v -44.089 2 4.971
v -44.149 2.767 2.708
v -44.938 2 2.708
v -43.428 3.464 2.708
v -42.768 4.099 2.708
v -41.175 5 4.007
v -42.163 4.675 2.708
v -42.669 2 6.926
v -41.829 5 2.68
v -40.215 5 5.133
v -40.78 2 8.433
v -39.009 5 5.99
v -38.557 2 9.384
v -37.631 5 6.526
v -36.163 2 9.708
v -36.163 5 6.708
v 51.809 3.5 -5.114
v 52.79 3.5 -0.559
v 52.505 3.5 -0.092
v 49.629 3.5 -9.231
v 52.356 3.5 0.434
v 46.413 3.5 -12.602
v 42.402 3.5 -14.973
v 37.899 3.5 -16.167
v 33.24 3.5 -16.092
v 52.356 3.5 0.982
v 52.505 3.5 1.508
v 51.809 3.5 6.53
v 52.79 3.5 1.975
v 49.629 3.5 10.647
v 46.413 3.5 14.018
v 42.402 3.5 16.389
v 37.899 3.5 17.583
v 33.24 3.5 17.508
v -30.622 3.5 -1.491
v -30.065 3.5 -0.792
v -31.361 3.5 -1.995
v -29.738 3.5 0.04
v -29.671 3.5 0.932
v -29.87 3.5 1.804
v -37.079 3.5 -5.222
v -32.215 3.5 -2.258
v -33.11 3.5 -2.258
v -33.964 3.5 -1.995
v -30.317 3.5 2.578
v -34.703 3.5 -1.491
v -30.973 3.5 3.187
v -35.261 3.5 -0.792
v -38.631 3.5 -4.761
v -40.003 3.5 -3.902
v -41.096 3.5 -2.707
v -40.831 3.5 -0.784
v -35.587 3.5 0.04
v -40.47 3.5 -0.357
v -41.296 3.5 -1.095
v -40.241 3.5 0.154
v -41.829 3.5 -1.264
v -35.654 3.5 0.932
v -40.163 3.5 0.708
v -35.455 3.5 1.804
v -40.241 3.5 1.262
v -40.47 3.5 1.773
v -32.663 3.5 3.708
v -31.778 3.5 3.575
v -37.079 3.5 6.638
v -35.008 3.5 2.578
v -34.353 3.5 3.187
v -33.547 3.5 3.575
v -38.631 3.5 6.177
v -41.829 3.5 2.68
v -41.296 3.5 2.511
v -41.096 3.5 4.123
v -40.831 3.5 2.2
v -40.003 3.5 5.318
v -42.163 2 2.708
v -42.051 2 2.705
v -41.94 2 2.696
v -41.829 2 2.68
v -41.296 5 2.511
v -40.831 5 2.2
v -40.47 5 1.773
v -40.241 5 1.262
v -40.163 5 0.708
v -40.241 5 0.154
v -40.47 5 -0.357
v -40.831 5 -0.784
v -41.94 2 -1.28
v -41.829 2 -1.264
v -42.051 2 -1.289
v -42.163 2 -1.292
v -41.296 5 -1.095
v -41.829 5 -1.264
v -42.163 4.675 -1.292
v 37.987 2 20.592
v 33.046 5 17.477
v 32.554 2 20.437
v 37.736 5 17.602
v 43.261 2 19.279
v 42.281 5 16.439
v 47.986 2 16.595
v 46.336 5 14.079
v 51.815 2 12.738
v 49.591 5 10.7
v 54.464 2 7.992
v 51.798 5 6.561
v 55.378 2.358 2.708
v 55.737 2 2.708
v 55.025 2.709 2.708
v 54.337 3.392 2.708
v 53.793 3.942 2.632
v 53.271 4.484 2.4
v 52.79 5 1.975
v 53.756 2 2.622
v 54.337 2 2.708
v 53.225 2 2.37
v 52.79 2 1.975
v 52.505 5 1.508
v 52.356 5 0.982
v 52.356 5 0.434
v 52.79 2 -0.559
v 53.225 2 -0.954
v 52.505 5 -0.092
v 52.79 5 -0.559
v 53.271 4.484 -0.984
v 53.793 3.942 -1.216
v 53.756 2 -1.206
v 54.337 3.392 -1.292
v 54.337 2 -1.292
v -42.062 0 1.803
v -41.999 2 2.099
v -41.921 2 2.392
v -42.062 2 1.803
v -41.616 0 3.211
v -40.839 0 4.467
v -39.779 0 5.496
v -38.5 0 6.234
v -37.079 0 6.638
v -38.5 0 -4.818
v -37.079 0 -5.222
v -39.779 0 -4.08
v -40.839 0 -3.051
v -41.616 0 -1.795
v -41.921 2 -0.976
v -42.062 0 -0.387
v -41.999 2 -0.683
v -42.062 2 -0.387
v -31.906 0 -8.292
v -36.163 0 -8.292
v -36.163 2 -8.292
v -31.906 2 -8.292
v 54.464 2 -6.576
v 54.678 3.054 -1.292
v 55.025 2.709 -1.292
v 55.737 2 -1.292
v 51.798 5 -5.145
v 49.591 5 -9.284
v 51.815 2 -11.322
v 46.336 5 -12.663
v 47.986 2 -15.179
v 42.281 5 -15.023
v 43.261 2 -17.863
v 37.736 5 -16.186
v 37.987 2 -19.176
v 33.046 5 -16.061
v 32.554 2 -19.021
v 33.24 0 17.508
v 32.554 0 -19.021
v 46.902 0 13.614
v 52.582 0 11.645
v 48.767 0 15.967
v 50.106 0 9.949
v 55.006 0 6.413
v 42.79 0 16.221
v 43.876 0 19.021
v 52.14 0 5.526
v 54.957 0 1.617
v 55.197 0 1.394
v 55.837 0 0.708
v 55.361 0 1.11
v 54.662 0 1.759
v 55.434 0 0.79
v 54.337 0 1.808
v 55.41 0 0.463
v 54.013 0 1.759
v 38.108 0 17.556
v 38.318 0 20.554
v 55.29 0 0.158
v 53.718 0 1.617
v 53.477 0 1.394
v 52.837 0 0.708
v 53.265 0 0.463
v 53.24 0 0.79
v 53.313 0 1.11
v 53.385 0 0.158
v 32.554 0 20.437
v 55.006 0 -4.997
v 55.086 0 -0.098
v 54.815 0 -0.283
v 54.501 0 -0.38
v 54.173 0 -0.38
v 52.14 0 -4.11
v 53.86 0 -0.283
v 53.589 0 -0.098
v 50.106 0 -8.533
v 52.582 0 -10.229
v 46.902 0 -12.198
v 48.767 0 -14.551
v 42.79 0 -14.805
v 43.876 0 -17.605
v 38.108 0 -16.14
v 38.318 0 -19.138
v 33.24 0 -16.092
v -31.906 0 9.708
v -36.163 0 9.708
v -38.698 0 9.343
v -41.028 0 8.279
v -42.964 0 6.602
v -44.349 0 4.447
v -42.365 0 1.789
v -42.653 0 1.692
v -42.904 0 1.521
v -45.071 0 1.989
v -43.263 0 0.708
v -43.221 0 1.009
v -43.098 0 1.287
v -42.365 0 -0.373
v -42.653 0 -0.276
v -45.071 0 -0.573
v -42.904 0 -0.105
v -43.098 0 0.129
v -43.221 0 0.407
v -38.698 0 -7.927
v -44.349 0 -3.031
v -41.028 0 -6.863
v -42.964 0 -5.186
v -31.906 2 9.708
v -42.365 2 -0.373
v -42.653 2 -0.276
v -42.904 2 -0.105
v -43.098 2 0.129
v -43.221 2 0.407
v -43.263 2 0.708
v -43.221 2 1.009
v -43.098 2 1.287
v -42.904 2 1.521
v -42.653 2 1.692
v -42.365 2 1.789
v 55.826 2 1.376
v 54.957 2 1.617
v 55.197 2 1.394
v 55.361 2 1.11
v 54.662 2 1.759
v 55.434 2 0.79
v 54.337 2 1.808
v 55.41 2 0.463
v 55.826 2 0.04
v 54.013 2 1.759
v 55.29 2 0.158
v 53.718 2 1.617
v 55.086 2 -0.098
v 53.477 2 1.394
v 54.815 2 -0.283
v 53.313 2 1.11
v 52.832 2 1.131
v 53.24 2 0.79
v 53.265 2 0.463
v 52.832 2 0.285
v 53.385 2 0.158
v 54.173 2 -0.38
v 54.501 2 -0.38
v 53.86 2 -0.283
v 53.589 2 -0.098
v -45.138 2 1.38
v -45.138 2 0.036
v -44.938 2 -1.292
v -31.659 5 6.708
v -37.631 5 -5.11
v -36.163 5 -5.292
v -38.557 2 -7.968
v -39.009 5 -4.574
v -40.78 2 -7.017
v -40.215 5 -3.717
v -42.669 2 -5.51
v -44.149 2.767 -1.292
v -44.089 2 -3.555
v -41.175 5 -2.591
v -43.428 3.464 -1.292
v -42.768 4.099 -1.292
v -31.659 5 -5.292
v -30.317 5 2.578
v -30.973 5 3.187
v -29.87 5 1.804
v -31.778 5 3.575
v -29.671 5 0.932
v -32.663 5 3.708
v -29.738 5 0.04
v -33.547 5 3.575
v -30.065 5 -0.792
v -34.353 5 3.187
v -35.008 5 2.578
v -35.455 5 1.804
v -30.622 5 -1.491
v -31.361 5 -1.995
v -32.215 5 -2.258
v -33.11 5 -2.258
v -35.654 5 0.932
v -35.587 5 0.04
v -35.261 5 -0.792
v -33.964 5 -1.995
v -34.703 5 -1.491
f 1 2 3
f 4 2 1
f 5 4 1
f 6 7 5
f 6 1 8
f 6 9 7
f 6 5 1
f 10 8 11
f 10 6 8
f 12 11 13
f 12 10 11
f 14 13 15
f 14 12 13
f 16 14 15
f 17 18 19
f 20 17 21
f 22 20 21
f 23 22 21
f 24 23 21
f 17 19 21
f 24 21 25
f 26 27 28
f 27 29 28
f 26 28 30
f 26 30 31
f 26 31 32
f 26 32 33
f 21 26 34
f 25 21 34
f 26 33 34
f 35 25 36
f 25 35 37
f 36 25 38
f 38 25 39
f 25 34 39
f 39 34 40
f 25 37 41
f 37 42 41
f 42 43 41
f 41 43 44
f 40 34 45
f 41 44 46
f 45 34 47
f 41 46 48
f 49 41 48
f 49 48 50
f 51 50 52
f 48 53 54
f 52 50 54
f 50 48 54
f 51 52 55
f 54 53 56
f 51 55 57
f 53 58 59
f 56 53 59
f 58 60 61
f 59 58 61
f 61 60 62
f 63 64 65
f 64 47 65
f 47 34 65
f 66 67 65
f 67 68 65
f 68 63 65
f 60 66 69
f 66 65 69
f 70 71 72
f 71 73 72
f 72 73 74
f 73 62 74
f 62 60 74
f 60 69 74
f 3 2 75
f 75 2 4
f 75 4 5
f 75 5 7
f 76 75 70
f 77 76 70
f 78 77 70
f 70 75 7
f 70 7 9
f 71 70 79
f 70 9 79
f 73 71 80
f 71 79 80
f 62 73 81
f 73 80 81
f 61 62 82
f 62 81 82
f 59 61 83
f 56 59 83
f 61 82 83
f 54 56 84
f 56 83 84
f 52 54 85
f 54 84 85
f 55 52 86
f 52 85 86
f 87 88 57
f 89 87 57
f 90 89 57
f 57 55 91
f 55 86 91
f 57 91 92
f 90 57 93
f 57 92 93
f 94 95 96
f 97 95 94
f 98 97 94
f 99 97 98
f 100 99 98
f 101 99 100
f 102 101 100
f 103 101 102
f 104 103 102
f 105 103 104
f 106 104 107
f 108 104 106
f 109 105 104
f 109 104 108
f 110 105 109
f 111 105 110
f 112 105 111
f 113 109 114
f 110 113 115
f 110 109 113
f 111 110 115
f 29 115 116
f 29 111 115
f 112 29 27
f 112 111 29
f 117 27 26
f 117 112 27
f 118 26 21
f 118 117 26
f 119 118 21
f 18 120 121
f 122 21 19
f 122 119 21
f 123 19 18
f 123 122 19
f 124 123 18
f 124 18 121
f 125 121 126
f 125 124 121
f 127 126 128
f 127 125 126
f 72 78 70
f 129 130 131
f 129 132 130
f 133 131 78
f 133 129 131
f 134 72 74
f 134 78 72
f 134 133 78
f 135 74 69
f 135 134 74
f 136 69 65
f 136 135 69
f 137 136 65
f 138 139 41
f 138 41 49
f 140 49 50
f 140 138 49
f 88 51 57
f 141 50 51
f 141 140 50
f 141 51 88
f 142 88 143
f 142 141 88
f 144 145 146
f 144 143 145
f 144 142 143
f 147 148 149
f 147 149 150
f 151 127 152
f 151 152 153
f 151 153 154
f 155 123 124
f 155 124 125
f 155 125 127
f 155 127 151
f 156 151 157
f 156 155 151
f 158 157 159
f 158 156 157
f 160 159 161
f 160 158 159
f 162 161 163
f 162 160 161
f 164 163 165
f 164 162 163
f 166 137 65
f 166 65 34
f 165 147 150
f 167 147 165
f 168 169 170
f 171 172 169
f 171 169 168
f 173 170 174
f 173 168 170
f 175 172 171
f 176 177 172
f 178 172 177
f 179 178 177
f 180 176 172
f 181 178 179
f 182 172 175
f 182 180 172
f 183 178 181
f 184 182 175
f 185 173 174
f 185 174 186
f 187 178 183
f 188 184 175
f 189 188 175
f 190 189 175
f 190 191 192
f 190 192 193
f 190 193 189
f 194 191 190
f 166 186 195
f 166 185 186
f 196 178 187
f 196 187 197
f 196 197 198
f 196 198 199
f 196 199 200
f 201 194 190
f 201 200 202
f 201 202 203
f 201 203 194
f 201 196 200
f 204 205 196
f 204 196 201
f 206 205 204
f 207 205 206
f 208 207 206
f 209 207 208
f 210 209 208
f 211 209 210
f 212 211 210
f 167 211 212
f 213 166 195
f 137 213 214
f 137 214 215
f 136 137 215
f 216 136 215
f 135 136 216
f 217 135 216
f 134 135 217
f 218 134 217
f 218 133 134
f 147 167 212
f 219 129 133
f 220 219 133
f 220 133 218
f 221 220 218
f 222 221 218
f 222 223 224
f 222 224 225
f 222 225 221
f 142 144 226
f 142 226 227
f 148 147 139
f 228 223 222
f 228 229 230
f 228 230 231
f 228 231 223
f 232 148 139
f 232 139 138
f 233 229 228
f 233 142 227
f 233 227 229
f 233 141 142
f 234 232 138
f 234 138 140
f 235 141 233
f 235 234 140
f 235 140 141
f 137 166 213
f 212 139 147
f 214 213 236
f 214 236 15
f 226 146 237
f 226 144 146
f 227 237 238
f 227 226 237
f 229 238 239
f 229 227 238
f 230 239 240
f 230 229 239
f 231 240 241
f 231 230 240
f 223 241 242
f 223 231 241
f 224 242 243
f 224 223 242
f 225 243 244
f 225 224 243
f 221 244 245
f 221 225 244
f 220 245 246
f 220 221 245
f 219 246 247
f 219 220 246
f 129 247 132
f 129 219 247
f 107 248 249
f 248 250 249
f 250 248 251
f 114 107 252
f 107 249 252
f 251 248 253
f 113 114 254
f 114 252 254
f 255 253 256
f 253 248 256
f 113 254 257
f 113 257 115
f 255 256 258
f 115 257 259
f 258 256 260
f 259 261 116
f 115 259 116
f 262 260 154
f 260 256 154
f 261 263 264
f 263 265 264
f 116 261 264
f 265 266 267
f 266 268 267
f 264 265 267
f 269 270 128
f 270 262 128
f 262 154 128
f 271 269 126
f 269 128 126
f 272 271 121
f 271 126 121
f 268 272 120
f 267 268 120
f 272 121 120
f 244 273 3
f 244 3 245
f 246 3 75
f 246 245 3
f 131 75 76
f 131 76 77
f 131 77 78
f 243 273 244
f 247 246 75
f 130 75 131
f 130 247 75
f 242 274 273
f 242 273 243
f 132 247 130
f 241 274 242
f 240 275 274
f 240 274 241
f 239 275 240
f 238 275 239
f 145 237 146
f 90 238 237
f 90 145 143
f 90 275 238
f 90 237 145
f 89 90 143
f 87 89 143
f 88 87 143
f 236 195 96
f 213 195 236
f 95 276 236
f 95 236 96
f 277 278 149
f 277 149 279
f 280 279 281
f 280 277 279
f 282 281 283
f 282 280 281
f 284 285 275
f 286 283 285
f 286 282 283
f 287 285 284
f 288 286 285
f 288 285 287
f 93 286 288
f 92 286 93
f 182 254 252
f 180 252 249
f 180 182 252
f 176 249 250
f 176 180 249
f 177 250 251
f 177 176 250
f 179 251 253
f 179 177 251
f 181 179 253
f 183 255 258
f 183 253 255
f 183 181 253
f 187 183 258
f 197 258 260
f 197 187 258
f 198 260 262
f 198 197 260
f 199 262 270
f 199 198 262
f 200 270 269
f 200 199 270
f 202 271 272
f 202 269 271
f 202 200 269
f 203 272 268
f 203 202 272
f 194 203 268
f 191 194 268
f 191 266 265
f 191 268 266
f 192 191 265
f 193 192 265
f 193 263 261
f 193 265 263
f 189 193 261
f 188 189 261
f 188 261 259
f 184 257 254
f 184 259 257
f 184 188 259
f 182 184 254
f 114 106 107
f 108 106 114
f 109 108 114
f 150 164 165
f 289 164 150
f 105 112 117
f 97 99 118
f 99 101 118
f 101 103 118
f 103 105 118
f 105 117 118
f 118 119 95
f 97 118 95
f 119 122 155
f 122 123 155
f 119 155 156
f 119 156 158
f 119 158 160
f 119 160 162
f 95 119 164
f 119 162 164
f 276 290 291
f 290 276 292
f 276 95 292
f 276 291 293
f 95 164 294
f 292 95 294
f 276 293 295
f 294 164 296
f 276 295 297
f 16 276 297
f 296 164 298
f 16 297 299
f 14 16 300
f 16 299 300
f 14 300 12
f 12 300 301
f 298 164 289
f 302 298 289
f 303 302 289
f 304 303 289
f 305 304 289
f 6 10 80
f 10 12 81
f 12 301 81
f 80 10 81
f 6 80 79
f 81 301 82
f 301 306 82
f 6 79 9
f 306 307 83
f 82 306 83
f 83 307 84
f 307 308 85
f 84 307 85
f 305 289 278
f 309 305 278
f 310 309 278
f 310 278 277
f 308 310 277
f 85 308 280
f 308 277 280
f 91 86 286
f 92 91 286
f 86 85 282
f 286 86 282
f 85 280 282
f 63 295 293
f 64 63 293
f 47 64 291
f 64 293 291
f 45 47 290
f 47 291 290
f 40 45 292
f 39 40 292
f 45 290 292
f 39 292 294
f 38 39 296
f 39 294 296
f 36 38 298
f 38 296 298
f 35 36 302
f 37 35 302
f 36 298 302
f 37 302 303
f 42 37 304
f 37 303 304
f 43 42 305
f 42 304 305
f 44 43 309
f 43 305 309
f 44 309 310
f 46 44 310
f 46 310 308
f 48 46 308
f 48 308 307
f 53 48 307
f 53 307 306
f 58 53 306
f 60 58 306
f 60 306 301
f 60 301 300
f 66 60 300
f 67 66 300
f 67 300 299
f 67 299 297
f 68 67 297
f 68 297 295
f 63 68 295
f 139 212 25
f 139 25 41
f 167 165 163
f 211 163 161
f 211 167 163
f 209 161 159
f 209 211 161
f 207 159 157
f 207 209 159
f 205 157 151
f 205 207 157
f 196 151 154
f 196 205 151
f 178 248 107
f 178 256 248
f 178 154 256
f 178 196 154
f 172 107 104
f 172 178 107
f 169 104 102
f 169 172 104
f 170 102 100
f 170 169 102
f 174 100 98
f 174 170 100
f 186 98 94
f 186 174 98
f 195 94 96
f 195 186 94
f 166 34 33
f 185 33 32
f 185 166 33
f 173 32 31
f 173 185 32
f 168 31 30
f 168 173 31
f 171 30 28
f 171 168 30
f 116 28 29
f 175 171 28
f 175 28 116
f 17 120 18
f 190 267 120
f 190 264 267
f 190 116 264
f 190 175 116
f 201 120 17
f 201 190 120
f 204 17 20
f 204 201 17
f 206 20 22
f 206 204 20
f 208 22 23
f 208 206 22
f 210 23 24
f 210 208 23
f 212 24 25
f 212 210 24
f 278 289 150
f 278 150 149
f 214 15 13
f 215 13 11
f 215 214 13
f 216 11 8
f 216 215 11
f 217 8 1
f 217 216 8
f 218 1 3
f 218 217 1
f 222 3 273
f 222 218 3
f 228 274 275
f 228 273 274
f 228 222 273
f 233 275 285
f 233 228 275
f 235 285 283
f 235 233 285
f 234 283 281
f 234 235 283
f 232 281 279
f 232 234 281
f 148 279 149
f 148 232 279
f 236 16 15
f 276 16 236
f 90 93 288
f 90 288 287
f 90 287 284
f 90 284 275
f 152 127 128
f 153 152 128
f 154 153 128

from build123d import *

# Parameters (mm, degrees)
SKETCH2_R           = 1.1
BOSS_EXTRUDE1_DEPTH = 5
SKETCH3_OUTSIDE_W   = 130.75
SKETCH3_OUTSIDE_H   = 69.75
CUT_EXTRUDE1_DEPTH  = 3
CUT_EXTRUDE1_DRAFT  = -45
CUT_EXTRUDE2_DEPTH  = 3
CUT_EXTRUDE3_DEPTH  = 3
SKETCH6_R           = 3
CUT_EXTRUDE4_DEPTH  = 9
CUT_EXTRUDE5_DEPTH  = 3.5


with BuildPart() as part:
    # Sketch2 → Boss-Extrude1 (new body)
    with BuildSketch(Plane(origin=(0, 0, 0), x_dir=(1, 0, 0), z_dir=(0, 1, 0))):
        with BuildLine():
            Line((-36.162601626, 8.29200542), (-31.906454434, 8.29200542))
            Line((-31.906454434, 8.29200542), (32.553816284, 19.020616336))
            ThreePointArc((32.553816284, 19.020616336), (55.837398374, -0.70799458), (32.553816284, -20.436605496))
            Line((32.553816284, -20.436605496), (-31.906454434, -9.70799458))
            Line((-31.906454434, -9.70799458), (-36.162601626, -9.70799458))
            ThreePointArc((-36.162601626, -9.70799458), (-45.162601626, -0.70799458), (-36.162601626, 8.29200542))
        make_face()
        with Locations(Location((-42.162601626, -0.70799458, 0), (0, 0, 270))):
            Circle(SKETCH2_R, mode=Mode.SUBTRACT)
        with Locations(Location((54.337398374, -0.70799458, 0), (0, 0, 270))):
            Circle(SKETCH2_R, mode=Mode.SUBTRACT)
    extrude(amount=BOSS_EXTRUDE1_DEPTH)


with BuildPart() as cut_extrude1_tool:
    # Sketch3 outside → Cut-Extrude1 (with draft: the straight prism first)
    with BuildSketch(Plane(origin=(0, 5, 0), x_dir=(1, 0, 0), z_dir=(0, 1, 0))):
        with Locations((5.337, -0.708)):
            Rectangle(SKETCH3_OUTSIDE_W, SKETCH3_OUTSIDE_H)
        with BuildLine():
            ThreePointArc((-36.162601626, 5.29200542), (-42.162601626, -0.70799458), (-36.162601626, -6.70799458))
            Line((-36.162601626, -6.70799458), (-31.658503498, -6.70799458))
            Line((-31.658503498, -6.70799458), (33.046353598, -17.477313858))
            ThreePointArc((33.046353598, -17.477313858), (52.837398374, -0.70799458), (33.046353598, 16.061324698))
            Line((33.046353598, 16.061324698), (-31.658503498, 5.29200542))
            Line((-31.658503498, 5.29200542), (-36.162601626, 5.29200542))
        make_face(mode=Mode.SUBTRACT)
    extrude(amount=-CUT_EXTRUDE1_DEPTH)
    # Cut-Extrude1: the draft: its side faces are tilted about the plane it starts from
    cut_extrude1_sides = [cut_extrude1_tool.faces().sort_by_distance(p)[0] for p in [
        (5.337, 3.5, 35.583),
        (70.712, 3.5, 0.708),
        (5.337, 3.5, -34.167),
        (-60.038, 3.5, 0.708),
        (-33.910552562, 3.5, -5.29200542),
        (0.69392505, 3.5, -10.676665059),
        (52.837398374, 3.5, 0.70799458),
        (0.69392505, 3.5, 12.092654219),
        (-33.910552562, 3.5, 6.70799458),
        (-42.162601626, 3.5, 0.70799458),
    ]]
    draft(cut_extrude1_sides, Plane(origin=(0, 5, 0), x_dir=(1, 0, 0), z_dir=(0, 1, 0)), CUT_EXTRUDE1_DRAFT)


with BuildPart() as part_1:
    add(part.part)

    # Cut-Extrude1: cut by cut_extrude1_tool
    add(cut_extrude1_tool.part, mode=Mode.SUBTRACT)

    # Sketch4 → Cut-Extrude2 (cut)
    with BuildSketch(Plane(origin=(0, 5, 0), x_dir=(1, 0, 0), z_dir=(0, 1, 0))):
        with BuildLine():
            Line((-42.162601626, 1.29200542), (-47.036094896, 1.29200542))
            Line((-47.036094896, 1.29200542), (-47.036094896, -2.70799458))
            Line((-47.036094896, -2.70799458), (-42.162601626, -2.70799458))
            ThreePointArc((-42.162601626, -2.70799458), (-40.162601626, -0.70799458), (-42.162601626, 1.29200542))
        make_face()
    extrude(amount=-CUT_EXTRUDE2_DEPTH, mode=Mode.SUBTRACT)

    # Sketch5 → Cut-Extrude3 (cut)
    with BuildSketch(Plane(origin=(0, 5, 0), x_dir=(1, 0, 0), z_dir=(0, 1, 0))):
        with BuildLine():
            Line((54.337398374, 1.29200542), (57.452649993, 1.29200542))
            Line((57.452649993, 1.29200542), (57.452649993, -2.70799458))
            Line((57.452649993, -2.70799458), (54.337398374, -2.70799458))
            ThreePointArc((54.337398374, -2.70799458), (52.337398374, -0.70799458), (54.337398374, 1.29200542))
        make_face()
    extrude(amount=-CUT_EXTRUDE3_DEPTH, mode=Mode.SUBTRACT)

    # Sketch6 → Cut-Extrude4 (cut)
    with BuildSketch(Plane(origin=(0, 5, 0), x_dir=(1, 0, 0), z_dir=(0, 1, 0))):
        with Locations(Location((-32.662601626, -0.70799458, 0), (0, 0, 270))):
            Circle(SKETCH6_R)
    extrude(amount=-CUT_EXTRUDE4_DEPTH, mode=Mode.SUBTRACT)

    # Sketch7 → Cut-Extrude5 (cut)
    with BuildSketch(Plane.XZ):
        with BuildLine():
            Line((-37.079268293, 6.637557989), (33.240176152, 17.508424239))
            ThreePointArc((33.240176152, 17.508424239), (52.837398374, 0.70799458), (33.240176152, -16.092435079))
            Line((33.240176152, -16.092435079), (-37.079268293, -5.221568829))
            ThreePointArc((-37.079268293, -5.221568829), (-42.162601626, 0.70799458), (-37.079268293, 6.637557989))
        make_face()
    extrude(amount=-CUT_EXTRUDE5_DEPTH, mode=Mode.SUBTRACT)


solid = part_1.part
